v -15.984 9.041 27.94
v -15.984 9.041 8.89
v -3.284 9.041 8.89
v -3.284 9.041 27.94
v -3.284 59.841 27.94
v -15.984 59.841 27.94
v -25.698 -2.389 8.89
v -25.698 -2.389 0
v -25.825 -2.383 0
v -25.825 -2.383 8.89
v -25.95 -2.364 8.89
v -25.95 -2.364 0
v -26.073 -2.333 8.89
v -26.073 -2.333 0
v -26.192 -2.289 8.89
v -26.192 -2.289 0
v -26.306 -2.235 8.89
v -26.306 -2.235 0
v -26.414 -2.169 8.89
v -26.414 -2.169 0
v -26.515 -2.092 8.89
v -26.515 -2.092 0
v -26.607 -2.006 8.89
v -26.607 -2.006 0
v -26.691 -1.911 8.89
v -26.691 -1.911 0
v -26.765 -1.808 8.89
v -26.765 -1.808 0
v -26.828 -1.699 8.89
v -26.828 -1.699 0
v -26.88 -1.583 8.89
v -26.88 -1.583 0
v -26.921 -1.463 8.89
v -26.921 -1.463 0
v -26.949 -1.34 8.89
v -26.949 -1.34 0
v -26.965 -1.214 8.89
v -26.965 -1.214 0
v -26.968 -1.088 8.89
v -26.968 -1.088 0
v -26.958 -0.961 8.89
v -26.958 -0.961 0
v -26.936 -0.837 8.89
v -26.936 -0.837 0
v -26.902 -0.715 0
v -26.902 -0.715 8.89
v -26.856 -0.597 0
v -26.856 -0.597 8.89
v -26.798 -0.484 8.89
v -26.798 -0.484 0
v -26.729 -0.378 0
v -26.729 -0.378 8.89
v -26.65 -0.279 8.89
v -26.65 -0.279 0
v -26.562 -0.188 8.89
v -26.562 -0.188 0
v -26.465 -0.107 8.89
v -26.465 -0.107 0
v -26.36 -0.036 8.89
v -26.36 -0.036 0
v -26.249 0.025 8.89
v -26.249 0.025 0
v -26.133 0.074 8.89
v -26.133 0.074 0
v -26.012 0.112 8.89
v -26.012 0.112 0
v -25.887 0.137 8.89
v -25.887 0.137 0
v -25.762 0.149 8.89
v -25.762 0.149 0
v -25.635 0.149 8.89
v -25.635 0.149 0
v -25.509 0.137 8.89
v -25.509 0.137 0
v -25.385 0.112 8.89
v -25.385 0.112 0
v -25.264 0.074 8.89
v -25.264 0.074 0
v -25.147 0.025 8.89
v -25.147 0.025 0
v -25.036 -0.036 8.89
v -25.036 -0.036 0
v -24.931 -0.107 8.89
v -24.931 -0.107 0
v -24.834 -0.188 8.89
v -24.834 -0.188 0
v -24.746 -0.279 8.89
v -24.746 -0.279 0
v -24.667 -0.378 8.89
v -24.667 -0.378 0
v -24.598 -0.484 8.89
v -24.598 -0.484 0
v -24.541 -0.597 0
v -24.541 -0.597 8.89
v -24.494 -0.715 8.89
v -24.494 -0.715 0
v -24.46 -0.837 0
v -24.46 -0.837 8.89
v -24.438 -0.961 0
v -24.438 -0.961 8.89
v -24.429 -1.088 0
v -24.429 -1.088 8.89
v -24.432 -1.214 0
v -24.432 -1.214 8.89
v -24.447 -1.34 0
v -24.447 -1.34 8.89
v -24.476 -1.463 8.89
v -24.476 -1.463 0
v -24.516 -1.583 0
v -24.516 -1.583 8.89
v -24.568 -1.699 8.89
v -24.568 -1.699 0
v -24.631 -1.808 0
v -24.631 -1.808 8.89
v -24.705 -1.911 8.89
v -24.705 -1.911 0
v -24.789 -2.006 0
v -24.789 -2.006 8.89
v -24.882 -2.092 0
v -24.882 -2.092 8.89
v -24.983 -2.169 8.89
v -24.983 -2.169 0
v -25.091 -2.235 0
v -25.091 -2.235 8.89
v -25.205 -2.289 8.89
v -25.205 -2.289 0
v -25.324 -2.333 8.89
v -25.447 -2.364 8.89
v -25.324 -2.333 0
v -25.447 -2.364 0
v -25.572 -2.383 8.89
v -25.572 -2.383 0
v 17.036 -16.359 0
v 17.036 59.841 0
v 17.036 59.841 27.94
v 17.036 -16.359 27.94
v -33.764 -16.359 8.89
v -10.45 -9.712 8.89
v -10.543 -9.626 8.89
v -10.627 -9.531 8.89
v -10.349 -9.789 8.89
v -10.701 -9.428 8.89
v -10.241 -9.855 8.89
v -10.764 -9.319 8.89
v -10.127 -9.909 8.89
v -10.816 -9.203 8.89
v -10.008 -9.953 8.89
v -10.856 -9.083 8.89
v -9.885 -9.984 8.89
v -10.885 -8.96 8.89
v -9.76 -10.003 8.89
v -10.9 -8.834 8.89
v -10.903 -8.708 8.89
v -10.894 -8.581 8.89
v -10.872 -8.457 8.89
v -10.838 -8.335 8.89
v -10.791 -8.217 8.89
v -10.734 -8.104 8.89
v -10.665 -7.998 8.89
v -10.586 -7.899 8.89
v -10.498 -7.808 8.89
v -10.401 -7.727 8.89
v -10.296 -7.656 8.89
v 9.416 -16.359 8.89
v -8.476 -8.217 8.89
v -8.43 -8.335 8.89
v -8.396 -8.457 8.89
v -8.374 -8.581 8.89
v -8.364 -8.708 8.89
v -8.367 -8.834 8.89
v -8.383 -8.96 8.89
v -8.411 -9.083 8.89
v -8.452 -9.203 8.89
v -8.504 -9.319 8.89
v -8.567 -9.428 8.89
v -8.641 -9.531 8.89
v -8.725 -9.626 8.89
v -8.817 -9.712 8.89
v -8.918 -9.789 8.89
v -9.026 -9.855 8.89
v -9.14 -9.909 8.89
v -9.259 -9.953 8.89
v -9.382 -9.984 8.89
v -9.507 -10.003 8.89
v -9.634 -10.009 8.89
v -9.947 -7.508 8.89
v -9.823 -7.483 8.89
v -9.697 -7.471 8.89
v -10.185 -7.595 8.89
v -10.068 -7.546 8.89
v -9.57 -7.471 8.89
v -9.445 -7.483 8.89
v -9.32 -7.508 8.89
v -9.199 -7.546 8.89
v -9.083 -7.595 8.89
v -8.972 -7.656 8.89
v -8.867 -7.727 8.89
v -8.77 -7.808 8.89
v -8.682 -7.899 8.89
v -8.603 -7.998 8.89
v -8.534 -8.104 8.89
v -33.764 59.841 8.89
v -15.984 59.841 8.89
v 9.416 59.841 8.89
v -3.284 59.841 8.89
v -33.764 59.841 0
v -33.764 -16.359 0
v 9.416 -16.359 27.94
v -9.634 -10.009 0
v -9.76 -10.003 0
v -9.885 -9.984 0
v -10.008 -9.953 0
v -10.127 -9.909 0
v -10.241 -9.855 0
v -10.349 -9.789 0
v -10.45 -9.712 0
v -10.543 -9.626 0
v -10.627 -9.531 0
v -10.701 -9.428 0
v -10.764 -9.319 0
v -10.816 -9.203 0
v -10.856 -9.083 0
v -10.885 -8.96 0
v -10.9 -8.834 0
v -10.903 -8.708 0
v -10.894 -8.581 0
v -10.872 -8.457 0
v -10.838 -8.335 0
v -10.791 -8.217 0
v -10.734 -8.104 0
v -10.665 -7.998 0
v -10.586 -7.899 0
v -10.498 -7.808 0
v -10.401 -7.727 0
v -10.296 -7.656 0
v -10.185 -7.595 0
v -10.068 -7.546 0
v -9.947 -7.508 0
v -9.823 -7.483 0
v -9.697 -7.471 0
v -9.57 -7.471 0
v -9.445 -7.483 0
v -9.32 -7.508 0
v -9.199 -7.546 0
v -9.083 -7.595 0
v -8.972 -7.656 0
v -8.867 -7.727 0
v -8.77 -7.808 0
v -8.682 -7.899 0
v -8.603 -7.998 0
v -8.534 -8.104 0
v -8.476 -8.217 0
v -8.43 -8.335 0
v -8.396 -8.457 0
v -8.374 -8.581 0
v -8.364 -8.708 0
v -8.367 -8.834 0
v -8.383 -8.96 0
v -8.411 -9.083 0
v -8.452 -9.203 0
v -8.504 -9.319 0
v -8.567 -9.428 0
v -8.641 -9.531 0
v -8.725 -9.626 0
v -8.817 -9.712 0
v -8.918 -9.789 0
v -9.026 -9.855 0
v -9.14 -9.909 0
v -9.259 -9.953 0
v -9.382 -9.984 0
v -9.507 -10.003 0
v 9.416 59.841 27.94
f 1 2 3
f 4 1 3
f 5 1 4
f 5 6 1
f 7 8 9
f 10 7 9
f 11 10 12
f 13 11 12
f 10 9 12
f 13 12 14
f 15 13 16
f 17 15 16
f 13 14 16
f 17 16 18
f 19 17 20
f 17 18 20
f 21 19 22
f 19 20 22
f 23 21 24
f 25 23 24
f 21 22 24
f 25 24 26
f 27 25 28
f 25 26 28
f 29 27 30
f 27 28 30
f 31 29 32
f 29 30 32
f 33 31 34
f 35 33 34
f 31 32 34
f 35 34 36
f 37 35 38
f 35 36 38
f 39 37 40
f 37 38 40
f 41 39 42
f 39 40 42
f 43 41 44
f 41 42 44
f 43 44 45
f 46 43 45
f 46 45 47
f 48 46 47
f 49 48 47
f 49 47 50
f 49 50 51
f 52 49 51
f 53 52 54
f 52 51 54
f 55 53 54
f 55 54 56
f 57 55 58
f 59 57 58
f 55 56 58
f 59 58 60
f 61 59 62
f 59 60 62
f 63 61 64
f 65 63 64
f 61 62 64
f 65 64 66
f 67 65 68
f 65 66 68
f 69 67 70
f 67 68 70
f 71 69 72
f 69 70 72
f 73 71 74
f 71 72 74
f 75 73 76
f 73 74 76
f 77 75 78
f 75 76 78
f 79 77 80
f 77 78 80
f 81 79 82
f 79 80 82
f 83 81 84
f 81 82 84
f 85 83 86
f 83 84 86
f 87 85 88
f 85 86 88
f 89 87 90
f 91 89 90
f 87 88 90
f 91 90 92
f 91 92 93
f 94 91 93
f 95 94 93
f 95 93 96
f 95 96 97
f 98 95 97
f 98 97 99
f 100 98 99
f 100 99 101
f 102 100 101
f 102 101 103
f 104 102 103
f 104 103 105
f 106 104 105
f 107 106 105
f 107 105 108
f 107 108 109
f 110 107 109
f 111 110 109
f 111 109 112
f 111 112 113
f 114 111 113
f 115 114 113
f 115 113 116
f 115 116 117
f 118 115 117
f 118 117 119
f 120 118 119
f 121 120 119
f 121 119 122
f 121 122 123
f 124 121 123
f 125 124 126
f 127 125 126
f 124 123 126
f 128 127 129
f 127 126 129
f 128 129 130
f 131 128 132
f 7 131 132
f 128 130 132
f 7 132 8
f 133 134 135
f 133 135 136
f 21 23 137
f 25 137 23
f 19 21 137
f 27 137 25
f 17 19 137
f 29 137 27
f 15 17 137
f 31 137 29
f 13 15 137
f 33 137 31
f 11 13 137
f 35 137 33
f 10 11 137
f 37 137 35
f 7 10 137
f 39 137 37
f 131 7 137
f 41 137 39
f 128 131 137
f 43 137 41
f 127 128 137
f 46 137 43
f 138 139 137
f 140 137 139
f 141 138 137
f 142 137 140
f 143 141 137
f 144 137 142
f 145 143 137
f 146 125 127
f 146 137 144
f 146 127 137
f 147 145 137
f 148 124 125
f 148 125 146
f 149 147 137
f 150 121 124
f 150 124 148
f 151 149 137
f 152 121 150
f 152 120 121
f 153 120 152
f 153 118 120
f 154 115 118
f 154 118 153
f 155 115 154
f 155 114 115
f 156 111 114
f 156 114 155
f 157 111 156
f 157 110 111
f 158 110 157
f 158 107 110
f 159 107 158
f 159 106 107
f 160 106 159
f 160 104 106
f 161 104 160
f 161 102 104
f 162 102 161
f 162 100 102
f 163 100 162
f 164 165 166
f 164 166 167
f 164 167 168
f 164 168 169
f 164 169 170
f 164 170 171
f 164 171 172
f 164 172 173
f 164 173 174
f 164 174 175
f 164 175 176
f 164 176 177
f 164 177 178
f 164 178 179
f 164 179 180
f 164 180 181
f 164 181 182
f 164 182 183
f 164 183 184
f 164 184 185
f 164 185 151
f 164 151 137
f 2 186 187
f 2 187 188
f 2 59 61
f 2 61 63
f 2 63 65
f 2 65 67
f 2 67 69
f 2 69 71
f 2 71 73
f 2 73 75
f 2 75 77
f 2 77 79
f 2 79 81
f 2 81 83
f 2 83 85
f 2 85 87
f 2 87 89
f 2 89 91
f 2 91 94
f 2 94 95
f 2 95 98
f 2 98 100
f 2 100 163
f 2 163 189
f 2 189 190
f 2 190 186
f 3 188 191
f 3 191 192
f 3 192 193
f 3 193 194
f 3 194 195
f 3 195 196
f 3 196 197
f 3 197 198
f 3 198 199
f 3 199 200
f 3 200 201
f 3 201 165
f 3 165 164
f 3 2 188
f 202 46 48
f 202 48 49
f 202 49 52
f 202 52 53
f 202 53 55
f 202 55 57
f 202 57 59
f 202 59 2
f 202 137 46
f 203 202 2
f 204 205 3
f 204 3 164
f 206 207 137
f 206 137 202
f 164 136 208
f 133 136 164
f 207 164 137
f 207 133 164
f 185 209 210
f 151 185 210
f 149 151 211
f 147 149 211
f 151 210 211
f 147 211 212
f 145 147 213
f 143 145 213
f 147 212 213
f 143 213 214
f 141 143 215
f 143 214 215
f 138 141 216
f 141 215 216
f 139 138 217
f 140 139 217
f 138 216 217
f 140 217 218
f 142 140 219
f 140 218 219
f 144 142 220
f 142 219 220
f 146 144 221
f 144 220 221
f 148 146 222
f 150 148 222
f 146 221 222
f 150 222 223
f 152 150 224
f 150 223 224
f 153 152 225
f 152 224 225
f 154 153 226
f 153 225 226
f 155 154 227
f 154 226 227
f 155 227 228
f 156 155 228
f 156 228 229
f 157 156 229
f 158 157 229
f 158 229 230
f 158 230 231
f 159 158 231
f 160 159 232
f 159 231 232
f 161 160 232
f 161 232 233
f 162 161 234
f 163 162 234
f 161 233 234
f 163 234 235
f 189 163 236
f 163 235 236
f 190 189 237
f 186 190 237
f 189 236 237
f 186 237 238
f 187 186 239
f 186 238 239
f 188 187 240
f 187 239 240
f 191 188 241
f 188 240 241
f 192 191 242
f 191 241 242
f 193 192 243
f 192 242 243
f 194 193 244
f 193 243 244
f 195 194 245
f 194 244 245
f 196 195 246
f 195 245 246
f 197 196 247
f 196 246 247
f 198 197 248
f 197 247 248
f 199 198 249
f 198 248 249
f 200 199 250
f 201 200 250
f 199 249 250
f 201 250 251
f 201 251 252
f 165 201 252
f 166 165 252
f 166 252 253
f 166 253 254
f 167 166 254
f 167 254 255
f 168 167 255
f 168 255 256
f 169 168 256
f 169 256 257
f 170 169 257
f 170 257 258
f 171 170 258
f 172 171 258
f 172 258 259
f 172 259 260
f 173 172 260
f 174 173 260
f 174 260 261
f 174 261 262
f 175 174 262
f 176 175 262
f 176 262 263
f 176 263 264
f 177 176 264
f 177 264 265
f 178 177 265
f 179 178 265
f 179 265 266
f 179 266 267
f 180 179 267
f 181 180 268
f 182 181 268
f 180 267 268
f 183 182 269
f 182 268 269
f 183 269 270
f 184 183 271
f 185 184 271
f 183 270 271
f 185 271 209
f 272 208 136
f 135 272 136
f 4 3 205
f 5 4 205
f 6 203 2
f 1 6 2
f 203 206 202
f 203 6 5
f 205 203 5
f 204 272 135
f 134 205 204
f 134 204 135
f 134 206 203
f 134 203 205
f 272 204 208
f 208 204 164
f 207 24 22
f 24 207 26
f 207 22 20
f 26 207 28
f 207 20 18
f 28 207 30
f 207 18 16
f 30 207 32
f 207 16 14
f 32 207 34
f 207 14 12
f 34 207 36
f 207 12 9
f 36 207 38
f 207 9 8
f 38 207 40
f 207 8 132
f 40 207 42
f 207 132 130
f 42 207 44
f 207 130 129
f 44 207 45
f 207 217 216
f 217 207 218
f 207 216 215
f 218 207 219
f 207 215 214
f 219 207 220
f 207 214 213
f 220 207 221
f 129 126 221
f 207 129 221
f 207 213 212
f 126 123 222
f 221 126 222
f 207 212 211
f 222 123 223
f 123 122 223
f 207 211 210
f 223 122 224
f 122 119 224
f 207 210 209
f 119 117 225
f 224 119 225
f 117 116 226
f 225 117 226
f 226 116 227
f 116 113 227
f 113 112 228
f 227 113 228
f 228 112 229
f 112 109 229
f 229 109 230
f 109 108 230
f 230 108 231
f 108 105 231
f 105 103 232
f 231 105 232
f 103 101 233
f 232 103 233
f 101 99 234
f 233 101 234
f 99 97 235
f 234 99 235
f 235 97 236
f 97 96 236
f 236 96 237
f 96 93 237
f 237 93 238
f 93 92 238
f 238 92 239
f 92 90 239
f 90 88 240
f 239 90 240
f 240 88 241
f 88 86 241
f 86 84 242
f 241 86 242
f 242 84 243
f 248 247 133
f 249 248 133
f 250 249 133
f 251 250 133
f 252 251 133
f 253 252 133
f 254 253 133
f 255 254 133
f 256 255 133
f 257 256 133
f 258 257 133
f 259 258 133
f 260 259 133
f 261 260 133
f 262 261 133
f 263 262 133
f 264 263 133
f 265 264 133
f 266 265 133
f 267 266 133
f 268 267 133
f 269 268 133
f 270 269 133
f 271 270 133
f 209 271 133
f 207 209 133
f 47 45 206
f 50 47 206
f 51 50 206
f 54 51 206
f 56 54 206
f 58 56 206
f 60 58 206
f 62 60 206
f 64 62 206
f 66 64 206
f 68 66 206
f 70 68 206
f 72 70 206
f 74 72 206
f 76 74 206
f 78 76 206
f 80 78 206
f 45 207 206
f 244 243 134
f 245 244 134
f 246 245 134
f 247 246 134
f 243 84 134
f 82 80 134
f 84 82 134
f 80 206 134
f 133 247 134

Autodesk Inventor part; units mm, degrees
ref_plane "YZ Plane" through (0, 0, 0) normal (1, 0, 0) x (0, 1, 0)
ref_plane "XZ Plane" through (0, 0, 0) normal (0, 1, 0) x (-1, 0, 0)
ref_plane "XY Plane" through (0, 0, 0) normal (0, 0, 1) x (1, 0, 0)
sketch "Sketch1" plane through (0, 0, 0) normal (0, 0, 1) x (1, 0, 0)
  line L0 (-33.7638, 59.8408) -> (17.0362, 59.8408)
  line L1 (17.0362, 59.8408) -> (17.0362, -16.3592)
  line L2 (17.0362, -16.3592) -> (-33.7638, -16.3592)
  line L3 (-33.7638, -16.3592) -> (-33.7638, 59.8408)
  dimension "d0" = 50.8
  dimension "d1" = 76.2
extrude "Extrusion1" add sketch "Sketch1" along normal blind 8.89
sketch "Sketch2" plane through (0, 0, 8.89) normal (0, 0, 1) x (1, 0, 0)
  line L0 (17.0362, 59.8408) -> (17.0362, -16.3592) projected
  line L1 (-33.7638, 59.8408) -> (17.0362, 59.8408) projected
  line L2 (17.0362, -16.3592) -> (-33.7638, -16.3592) projected
  line L3 (9.4162, 59.8408) -> (9.4162, -16.3592)
  dimension "d4" = 7.62
extrude "Extrusion2" add sketch "Sketch2" along normal blind 19.05
sketch "Sketch3" plane through (0, 0, 8.89) normal (0, 0, 1) x (1, 0, 0)
  point P0 (9.4162, -16.3592)
  point P1 (-33.7638, -16.3592)
  point P2 (-9.6338, -8.7392)
  point P3 (-25.6982, -1.1192)
  dimension "d7" = 19.05
  dimension "d8" = 7.62
  dimension "d9" = 17.78
  dimension "d10" = 15.24
hole "Hole1" at (-9.6338, -8.7392, 8.89) at (-25.6982, -1.1192, 8.89) direction (0, 0, -1) diameter 2.54 depth 12.7 tip angle 118
sketch "Sketch4" plane through (0, 0, 8.89) normal (0, 0, 1) x (1, 0, 0)
  line L0 (9.4162, -16.3592) -> (9.4162, 59.8408) projected
  line L1 (-33.7638, 59.8408) -> (9.4162, 59.8408) projected
  line L2 (-15.9838, 59.8408) -> (-15.9838, 9.0408)
  line L3 (-15.9838, 9.0408) -> (-3.2838, 9.0408)
  line L4 (-3.2838, 9.0408) -> (-3.2838, 59.8408)
  dimension "d18" = 12.7
  dimension "d19" = 12.7
  dimension "d22" = 50.8
extrude "Extrusion3" add sketch "Sketch4" along normal up to surface (19.05 mm away)
properties part number "base"
